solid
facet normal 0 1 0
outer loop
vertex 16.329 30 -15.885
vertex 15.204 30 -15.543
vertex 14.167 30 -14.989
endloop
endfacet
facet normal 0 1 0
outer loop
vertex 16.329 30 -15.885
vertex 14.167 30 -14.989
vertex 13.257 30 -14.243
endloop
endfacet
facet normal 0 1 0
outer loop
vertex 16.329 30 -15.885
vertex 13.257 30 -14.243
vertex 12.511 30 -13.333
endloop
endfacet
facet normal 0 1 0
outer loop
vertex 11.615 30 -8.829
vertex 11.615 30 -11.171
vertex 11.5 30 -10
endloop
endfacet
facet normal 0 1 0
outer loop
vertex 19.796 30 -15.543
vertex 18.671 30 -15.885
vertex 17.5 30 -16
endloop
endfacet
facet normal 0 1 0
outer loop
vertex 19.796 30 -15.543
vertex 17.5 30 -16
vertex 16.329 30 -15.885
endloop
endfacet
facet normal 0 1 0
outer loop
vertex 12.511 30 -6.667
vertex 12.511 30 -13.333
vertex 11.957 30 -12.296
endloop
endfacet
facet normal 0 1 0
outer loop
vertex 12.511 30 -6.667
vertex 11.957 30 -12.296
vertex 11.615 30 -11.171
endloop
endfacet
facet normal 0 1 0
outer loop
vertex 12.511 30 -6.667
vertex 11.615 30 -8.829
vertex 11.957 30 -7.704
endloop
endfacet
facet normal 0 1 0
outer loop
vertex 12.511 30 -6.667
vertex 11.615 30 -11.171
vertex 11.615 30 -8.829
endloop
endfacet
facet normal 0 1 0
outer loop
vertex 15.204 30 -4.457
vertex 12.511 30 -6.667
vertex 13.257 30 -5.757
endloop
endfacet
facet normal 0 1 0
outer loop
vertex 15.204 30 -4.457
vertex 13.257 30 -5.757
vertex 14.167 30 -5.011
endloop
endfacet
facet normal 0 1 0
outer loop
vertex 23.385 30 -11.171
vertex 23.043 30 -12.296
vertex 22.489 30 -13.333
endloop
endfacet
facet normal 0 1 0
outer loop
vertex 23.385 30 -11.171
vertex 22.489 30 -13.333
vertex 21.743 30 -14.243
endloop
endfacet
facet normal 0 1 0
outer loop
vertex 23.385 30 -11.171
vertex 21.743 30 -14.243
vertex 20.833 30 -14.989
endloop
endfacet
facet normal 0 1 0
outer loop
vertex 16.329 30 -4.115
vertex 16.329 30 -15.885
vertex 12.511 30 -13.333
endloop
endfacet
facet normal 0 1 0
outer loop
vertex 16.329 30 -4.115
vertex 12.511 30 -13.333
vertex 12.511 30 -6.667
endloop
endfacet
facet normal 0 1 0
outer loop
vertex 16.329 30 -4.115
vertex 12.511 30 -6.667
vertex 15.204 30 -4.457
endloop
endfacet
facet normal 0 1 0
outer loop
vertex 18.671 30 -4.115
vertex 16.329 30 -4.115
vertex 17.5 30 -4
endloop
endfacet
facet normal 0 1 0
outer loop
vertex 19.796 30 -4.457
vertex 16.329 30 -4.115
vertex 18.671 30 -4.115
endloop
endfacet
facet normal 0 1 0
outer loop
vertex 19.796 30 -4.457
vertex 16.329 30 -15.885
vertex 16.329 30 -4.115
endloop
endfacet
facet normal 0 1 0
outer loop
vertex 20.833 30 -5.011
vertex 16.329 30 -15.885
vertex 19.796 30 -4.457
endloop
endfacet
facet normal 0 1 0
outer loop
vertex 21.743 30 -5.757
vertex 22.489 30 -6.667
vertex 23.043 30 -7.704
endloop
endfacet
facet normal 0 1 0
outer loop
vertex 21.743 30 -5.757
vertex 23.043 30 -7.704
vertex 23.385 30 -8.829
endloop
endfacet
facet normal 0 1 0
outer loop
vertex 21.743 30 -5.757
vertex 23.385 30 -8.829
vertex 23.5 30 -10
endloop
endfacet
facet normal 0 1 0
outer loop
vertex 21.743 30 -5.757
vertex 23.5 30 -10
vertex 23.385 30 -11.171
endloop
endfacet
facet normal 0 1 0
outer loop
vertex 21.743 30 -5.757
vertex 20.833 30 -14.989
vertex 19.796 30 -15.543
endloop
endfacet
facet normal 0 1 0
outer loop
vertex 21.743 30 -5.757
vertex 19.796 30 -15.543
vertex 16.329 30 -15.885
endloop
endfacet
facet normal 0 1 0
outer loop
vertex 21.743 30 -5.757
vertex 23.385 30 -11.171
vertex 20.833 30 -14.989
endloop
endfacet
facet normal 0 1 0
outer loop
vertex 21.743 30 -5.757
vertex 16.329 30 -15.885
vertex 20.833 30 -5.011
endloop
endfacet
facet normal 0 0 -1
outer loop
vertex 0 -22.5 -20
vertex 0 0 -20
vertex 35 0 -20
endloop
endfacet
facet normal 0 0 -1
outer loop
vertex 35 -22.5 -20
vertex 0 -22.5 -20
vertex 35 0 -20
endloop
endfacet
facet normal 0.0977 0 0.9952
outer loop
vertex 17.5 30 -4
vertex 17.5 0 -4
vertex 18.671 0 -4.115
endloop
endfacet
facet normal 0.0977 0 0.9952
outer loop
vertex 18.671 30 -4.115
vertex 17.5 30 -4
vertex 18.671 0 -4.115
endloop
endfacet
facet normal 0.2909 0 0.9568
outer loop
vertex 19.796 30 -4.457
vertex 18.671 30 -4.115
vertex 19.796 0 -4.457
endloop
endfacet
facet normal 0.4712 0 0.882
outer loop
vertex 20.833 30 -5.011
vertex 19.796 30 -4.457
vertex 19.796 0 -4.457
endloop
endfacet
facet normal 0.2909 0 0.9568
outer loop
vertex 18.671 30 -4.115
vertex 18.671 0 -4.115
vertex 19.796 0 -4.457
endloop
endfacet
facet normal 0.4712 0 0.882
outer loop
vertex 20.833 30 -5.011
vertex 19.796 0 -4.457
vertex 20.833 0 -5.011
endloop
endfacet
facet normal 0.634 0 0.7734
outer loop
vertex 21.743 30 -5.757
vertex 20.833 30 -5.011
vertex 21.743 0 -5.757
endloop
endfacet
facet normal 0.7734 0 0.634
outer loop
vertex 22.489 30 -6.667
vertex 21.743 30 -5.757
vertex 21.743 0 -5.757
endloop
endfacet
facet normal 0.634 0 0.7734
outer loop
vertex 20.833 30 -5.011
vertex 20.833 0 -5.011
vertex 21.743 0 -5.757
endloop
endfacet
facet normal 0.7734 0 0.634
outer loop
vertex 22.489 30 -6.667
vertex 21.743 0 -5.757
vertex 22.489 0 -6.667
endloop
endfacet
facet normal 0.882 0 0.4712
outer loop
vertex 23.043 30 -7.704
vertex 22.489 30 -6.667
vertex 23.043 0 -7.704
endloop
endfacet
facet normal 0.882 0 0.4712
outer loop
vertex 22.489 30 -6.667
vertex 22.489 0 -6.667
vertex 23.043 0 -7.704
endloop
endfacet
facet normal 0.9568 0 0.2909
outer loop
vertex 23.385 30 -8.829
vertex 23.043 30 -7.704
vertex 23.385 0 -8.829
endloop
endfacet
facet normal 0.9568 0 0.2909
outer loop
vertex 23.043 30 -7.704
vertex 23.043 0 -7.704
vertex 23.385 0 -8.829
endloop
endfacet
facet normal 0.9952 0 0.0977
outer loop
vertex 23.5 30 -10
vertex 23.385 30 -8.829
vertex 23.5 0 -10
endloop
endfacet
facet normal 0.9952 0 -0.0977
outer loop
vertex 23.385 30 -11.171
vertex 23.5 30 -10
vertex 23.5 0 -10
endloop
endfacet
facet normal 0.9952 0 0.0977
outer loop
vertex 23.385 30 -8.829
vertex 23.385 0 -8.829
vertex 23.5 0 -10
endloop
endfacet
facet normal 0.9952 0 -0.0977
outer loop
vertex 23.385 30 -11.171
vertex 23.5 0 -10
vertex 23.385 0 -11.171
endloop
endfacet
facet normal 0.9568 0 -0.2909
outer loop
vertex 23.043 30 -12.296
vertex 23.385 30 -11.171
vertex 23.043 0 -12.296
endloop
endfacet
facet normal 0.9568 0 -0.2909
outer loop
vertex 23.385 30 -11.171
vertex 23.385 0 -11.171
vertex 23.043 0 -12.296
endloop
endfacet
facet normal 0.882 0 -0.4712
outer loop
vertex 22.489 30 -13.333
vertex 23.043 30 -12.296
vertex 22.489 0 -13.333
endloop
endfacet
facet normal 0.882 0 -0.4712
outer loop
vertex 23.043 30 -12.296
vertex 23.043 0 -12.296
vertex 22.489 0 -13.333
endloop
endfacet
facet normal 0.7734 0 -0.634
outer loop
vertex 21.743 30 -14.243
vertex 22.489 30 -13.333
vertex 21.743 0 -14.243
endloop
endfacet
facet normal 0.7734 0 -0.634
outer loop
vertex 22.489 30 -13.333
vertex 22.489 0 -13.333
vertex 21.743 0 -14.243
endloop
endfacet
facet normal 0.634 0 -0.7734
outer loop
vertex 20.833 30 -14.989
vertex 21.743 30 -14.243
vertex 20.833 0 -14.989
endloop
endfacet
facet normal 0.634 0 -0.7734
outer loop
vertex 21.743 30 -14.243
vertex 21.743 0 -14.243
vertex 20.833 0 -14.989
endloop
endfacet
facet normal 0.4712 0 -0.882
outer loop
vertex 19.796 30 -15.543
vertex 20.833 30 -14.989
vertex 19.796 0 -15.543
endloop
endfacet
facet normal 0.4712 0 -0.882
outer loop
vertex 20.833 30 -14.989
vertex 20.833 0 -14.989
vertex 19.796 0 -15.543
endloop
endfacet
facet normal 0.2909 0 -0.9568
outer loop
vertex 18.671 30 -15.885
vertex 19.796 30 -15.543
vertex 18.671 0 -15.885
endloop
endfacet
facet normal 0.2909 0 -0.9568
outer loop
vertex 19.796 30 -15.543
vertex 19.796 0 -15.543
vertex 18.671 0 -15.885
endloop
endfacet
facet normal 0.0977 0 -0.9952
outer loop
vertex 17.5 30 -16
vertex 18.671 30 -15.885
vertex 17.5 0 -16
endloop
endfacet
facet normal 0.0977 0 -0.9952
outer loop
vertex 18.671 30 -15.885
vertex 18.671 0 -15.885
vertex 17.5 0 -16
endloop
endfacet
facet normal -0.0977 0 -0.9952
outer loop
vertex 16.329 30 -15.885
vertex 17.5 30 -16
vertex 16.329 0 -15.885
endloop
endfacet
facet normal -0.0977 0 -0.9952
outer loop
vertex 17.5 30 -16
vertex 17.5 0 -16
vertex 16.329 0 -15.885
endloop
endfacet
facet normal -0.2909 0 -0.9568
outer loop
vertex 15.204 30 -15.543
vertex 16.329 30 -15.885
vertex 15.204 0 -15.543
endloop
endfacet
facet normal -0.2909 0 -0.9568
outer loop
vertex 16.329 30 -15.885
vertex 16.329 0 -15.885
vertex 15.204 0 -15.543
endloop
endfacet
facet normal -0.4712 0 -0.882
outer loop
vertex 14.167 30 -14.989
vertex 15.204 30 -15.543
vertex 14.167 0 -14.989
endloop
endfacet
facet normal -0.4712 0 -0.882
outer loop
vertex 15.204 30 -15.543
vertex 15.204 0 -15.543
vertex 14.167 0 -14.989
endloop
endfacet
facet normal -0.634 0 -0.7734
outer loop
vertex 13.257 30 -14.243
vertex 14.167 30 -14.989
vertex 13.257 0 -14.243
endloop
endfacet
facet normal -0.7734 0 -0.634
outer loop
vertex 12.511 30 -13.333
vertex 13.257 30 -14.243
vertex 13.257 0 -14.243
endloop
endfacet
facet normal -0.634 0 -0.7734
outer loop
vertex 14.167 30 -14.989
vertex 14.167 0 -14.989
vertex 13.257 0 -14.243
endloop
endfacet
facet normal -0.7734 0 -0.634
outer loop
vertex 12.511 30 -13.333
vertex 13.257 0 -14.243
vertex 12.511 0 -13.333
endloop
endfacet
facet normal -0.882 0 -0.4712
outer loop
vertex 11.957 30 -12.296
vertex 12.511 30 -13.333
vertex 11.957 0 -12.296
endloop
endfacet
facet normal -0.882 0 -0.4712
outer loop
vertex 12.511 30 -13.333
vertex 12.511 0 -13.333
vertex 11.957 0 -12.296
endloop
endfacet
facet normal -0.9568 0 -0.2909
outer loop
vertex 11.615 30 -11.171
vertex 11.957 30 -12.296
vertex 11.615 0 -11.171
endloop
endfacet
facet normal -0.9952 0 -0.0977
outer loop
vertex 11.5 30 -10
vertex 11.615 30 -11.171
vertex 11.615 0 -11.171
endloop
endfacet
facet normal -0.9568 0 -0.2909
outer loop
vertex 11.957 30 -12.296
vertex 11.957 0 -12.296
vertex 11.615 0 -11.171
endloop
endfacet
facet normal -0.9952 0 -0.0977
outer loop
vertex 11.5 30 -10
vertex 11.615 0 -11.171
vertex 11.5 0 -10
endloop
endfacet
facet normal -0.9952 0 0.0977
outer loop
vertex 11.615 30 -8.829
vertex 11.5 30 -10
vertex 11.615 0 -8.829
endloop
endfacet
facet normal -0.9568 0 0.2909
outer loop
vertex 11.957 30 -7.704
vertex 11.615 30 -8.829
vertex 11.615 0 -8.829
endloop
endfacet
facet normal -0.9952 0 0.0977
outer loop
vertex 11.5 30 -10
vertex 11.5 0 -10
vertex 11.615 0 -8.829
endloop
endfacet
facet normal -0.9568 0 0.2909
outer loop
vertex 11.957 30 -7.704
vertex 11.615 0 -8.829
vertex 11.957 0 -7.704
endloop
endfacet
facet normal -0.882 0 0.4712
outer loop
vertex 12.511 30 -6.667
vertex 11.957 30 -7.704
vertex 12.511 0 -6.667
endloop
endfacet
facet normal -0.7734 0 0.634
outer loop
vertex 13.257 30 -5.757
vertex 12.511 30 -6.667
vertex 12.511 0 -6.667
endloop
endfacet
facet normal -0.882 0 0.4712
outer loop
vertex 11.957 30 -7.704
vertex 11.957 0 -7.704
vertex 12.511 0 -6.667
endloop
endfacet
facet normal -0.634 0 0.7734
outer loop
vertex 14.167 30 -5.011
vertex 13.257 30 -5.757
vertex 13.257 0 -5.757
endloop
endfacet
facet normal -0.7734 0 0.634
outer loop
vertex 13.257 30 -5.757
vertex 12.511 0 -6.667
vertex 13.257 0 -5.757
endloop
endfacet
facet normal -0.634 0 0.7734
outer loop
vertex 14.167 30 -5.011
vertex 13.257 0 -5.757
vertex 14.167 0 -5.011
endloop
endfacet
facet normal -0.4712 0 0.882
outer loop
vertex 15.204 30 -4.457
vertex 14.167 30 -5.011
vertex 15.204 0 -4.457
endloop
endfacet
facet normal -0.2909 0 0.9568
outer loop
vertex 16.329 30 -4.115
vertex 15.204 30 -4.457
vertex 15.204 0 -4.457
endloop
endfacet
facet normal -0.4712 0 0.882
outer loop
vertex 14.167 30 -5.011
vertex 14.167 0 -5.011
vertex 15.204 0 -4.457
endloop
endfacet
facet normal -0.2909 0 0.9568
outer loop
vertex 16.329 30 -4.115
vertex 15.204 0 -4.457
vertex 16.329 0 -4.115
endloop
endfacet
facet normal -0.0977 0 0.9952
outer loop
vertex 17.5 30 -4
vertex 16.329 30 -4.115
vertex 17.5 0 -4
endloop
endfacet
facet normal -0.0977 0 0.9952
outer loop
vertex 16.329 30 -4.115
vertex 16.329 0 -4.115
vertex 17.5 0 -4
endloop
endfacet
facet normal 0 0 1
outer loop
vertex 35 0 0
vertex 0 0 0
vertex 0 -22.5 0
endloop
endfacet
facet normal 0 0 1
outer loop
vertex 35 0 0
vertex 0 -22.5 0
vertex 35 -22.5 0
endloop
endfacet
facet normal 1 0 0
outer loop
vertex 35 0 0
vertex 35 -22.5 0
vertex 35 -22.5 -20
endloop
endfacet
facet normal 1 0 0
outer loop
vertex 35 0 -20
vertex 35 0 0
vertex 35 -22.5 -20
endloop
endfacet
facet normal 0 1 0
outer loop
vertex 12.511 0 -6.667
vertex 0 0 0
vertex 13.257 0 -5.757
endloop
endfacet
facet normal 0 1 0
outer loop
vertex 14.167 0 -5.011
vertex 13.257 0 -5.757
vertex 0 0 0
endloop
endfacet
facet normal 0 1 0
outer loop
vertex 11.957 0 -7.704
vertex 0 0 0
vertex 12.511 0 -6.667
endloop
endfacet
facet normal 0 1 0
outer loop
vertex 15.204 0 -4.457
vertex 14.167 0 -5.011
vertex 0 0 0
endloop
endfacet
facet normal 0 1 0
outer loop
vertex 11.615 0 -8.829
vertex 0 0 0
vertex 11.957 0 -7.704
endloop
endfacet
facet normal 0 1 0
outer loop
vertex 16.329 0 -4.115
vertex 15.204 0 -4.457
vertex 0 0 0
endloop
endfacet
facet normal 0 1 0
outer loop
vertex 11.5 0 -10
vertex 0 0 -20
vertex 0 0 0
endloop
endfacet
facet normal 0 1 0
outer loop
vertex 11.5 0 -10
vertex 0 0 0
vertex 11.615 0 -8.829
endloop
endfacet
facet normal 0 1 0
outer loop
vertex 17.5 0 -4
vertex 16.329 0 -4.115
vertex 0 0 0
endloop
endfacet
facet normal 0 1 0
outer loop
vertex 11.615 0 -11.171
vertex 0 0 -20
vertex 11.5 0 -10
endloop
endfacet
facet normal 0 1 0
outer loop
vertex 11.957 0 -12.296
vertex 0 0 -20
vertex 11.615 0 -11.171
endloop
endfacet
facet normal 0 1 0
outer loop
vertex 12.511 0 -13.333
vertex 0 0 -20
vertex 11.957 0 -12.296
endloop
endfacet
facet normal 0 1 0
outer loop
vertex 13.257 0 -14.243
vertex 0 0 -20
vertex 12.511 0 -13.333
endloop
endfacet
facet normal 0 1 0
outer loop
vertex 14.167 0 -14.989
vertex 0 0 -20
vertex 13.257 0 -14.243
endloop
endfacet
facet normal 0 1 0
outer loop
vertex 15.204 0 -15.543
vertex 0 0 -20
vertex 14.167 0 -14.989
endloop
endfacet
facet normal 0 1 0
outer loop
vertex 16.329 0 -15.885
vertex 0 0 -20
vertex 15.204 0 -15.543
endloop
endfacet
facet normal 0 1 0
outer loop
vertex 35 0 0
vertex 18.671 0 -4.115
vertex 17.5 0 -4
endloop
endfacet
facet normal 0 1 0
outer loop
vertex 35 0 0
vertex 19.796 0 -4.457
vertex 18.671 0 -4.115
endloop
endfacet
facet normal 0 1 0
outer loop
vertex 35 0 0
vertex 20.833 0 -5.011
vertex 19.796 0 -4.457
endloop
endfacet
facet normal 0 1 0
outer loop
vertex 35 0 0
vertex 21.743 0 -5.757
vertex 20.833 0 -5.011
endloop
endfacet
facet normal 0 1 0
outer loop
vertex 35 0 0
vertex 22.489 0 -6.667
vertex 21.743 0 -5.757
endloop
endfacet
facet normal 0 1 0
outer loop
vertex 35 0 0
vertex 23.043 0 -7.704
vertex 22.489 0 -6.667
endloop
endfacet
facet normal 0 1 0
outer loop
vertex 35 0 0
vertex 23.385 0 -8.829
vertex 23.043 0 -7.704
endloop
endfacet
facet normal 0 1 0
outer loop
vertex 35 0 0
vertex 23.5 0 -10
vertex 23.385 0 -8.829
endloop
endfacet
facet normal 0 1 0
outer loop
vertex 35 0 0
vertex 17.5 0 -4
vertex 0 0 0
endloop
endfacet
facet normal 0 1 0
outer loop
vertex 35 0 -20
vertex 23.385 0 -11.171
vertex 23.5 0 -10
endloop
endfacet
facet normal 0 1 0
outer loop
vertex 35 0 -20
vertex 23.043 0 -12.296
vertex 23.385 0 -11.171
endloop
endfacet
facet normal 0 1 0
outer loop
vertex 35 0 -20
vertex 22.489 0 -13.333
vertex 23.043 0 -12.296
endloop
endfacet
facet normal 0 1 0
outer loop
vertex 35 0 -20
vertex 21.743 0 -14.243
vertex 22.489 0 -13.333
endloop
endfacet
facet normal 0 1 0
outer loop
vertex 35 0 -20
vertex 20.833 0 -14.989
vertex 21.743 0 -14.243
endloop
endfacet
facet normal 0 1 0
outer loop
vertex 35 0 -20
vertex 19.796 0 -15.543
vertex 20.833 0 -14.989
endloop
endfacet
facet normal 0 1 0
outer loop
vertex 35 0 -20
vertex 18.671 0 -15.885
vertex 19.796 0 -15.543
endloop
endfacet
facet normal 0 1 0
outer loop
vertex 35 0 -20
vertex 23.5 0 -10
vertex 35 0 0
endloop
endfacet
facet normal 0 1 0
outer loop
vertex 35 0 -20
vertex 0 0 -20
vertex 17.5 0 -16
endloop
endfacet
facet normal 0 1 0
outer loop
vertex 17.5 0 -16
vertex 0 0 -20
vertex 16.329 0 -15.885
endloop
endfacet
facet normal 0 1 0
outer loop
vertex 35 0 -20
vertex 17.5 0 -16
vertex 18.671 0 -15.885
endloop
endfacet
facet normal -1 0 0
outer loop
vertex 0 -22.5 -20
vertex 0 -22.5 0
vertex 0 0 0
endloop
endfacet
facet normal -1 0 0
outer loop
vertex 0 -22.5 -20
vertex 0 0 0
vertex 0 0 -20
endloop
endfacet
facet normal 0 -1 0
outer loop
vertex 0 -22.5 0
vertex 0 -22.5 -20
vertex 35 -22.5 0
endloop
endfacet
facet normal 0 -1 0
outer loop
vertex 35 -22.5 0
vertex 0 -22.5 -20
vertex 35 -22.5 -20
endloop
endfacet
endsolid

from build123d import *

# Parameters (mm, degrees)
SKETCH1_W      = 35
SKETCH1_H      = 20
EXTRUDE1_DEPTH = 22.5
SKETCH2_R      = 6
EXTRUDE2_DEPTH = 30


with BuildPart() as part:
    # Sketch1 → Extrude1 (new body)
    with BuildSketch(Plane(origin=(0, 0, 0), x_dir=(1, 0, 0), z_dir=(0, 1, 0))):
        with Locations((17.5, 10)):
            Rectangle(SKETCH1_W, SKETCH1_H)
    extrude(amount=-EXTRUDE1_DEPTH)

    # Sketch2 → Extrude2 (add)
    with BuildSketch(Plane(origin=(0, 0, 0), x_dir=(1, 0, 0), z_dir=(0, 1, 0))):
        with Locations(Location((17.5, 10, 0), (0, 0, 270))):  # turned: the seam where the file's is
            Circle(SKETCH2_R)
    extrude(amount=EXTRUDE2_DEPTH)


solid = part.part
